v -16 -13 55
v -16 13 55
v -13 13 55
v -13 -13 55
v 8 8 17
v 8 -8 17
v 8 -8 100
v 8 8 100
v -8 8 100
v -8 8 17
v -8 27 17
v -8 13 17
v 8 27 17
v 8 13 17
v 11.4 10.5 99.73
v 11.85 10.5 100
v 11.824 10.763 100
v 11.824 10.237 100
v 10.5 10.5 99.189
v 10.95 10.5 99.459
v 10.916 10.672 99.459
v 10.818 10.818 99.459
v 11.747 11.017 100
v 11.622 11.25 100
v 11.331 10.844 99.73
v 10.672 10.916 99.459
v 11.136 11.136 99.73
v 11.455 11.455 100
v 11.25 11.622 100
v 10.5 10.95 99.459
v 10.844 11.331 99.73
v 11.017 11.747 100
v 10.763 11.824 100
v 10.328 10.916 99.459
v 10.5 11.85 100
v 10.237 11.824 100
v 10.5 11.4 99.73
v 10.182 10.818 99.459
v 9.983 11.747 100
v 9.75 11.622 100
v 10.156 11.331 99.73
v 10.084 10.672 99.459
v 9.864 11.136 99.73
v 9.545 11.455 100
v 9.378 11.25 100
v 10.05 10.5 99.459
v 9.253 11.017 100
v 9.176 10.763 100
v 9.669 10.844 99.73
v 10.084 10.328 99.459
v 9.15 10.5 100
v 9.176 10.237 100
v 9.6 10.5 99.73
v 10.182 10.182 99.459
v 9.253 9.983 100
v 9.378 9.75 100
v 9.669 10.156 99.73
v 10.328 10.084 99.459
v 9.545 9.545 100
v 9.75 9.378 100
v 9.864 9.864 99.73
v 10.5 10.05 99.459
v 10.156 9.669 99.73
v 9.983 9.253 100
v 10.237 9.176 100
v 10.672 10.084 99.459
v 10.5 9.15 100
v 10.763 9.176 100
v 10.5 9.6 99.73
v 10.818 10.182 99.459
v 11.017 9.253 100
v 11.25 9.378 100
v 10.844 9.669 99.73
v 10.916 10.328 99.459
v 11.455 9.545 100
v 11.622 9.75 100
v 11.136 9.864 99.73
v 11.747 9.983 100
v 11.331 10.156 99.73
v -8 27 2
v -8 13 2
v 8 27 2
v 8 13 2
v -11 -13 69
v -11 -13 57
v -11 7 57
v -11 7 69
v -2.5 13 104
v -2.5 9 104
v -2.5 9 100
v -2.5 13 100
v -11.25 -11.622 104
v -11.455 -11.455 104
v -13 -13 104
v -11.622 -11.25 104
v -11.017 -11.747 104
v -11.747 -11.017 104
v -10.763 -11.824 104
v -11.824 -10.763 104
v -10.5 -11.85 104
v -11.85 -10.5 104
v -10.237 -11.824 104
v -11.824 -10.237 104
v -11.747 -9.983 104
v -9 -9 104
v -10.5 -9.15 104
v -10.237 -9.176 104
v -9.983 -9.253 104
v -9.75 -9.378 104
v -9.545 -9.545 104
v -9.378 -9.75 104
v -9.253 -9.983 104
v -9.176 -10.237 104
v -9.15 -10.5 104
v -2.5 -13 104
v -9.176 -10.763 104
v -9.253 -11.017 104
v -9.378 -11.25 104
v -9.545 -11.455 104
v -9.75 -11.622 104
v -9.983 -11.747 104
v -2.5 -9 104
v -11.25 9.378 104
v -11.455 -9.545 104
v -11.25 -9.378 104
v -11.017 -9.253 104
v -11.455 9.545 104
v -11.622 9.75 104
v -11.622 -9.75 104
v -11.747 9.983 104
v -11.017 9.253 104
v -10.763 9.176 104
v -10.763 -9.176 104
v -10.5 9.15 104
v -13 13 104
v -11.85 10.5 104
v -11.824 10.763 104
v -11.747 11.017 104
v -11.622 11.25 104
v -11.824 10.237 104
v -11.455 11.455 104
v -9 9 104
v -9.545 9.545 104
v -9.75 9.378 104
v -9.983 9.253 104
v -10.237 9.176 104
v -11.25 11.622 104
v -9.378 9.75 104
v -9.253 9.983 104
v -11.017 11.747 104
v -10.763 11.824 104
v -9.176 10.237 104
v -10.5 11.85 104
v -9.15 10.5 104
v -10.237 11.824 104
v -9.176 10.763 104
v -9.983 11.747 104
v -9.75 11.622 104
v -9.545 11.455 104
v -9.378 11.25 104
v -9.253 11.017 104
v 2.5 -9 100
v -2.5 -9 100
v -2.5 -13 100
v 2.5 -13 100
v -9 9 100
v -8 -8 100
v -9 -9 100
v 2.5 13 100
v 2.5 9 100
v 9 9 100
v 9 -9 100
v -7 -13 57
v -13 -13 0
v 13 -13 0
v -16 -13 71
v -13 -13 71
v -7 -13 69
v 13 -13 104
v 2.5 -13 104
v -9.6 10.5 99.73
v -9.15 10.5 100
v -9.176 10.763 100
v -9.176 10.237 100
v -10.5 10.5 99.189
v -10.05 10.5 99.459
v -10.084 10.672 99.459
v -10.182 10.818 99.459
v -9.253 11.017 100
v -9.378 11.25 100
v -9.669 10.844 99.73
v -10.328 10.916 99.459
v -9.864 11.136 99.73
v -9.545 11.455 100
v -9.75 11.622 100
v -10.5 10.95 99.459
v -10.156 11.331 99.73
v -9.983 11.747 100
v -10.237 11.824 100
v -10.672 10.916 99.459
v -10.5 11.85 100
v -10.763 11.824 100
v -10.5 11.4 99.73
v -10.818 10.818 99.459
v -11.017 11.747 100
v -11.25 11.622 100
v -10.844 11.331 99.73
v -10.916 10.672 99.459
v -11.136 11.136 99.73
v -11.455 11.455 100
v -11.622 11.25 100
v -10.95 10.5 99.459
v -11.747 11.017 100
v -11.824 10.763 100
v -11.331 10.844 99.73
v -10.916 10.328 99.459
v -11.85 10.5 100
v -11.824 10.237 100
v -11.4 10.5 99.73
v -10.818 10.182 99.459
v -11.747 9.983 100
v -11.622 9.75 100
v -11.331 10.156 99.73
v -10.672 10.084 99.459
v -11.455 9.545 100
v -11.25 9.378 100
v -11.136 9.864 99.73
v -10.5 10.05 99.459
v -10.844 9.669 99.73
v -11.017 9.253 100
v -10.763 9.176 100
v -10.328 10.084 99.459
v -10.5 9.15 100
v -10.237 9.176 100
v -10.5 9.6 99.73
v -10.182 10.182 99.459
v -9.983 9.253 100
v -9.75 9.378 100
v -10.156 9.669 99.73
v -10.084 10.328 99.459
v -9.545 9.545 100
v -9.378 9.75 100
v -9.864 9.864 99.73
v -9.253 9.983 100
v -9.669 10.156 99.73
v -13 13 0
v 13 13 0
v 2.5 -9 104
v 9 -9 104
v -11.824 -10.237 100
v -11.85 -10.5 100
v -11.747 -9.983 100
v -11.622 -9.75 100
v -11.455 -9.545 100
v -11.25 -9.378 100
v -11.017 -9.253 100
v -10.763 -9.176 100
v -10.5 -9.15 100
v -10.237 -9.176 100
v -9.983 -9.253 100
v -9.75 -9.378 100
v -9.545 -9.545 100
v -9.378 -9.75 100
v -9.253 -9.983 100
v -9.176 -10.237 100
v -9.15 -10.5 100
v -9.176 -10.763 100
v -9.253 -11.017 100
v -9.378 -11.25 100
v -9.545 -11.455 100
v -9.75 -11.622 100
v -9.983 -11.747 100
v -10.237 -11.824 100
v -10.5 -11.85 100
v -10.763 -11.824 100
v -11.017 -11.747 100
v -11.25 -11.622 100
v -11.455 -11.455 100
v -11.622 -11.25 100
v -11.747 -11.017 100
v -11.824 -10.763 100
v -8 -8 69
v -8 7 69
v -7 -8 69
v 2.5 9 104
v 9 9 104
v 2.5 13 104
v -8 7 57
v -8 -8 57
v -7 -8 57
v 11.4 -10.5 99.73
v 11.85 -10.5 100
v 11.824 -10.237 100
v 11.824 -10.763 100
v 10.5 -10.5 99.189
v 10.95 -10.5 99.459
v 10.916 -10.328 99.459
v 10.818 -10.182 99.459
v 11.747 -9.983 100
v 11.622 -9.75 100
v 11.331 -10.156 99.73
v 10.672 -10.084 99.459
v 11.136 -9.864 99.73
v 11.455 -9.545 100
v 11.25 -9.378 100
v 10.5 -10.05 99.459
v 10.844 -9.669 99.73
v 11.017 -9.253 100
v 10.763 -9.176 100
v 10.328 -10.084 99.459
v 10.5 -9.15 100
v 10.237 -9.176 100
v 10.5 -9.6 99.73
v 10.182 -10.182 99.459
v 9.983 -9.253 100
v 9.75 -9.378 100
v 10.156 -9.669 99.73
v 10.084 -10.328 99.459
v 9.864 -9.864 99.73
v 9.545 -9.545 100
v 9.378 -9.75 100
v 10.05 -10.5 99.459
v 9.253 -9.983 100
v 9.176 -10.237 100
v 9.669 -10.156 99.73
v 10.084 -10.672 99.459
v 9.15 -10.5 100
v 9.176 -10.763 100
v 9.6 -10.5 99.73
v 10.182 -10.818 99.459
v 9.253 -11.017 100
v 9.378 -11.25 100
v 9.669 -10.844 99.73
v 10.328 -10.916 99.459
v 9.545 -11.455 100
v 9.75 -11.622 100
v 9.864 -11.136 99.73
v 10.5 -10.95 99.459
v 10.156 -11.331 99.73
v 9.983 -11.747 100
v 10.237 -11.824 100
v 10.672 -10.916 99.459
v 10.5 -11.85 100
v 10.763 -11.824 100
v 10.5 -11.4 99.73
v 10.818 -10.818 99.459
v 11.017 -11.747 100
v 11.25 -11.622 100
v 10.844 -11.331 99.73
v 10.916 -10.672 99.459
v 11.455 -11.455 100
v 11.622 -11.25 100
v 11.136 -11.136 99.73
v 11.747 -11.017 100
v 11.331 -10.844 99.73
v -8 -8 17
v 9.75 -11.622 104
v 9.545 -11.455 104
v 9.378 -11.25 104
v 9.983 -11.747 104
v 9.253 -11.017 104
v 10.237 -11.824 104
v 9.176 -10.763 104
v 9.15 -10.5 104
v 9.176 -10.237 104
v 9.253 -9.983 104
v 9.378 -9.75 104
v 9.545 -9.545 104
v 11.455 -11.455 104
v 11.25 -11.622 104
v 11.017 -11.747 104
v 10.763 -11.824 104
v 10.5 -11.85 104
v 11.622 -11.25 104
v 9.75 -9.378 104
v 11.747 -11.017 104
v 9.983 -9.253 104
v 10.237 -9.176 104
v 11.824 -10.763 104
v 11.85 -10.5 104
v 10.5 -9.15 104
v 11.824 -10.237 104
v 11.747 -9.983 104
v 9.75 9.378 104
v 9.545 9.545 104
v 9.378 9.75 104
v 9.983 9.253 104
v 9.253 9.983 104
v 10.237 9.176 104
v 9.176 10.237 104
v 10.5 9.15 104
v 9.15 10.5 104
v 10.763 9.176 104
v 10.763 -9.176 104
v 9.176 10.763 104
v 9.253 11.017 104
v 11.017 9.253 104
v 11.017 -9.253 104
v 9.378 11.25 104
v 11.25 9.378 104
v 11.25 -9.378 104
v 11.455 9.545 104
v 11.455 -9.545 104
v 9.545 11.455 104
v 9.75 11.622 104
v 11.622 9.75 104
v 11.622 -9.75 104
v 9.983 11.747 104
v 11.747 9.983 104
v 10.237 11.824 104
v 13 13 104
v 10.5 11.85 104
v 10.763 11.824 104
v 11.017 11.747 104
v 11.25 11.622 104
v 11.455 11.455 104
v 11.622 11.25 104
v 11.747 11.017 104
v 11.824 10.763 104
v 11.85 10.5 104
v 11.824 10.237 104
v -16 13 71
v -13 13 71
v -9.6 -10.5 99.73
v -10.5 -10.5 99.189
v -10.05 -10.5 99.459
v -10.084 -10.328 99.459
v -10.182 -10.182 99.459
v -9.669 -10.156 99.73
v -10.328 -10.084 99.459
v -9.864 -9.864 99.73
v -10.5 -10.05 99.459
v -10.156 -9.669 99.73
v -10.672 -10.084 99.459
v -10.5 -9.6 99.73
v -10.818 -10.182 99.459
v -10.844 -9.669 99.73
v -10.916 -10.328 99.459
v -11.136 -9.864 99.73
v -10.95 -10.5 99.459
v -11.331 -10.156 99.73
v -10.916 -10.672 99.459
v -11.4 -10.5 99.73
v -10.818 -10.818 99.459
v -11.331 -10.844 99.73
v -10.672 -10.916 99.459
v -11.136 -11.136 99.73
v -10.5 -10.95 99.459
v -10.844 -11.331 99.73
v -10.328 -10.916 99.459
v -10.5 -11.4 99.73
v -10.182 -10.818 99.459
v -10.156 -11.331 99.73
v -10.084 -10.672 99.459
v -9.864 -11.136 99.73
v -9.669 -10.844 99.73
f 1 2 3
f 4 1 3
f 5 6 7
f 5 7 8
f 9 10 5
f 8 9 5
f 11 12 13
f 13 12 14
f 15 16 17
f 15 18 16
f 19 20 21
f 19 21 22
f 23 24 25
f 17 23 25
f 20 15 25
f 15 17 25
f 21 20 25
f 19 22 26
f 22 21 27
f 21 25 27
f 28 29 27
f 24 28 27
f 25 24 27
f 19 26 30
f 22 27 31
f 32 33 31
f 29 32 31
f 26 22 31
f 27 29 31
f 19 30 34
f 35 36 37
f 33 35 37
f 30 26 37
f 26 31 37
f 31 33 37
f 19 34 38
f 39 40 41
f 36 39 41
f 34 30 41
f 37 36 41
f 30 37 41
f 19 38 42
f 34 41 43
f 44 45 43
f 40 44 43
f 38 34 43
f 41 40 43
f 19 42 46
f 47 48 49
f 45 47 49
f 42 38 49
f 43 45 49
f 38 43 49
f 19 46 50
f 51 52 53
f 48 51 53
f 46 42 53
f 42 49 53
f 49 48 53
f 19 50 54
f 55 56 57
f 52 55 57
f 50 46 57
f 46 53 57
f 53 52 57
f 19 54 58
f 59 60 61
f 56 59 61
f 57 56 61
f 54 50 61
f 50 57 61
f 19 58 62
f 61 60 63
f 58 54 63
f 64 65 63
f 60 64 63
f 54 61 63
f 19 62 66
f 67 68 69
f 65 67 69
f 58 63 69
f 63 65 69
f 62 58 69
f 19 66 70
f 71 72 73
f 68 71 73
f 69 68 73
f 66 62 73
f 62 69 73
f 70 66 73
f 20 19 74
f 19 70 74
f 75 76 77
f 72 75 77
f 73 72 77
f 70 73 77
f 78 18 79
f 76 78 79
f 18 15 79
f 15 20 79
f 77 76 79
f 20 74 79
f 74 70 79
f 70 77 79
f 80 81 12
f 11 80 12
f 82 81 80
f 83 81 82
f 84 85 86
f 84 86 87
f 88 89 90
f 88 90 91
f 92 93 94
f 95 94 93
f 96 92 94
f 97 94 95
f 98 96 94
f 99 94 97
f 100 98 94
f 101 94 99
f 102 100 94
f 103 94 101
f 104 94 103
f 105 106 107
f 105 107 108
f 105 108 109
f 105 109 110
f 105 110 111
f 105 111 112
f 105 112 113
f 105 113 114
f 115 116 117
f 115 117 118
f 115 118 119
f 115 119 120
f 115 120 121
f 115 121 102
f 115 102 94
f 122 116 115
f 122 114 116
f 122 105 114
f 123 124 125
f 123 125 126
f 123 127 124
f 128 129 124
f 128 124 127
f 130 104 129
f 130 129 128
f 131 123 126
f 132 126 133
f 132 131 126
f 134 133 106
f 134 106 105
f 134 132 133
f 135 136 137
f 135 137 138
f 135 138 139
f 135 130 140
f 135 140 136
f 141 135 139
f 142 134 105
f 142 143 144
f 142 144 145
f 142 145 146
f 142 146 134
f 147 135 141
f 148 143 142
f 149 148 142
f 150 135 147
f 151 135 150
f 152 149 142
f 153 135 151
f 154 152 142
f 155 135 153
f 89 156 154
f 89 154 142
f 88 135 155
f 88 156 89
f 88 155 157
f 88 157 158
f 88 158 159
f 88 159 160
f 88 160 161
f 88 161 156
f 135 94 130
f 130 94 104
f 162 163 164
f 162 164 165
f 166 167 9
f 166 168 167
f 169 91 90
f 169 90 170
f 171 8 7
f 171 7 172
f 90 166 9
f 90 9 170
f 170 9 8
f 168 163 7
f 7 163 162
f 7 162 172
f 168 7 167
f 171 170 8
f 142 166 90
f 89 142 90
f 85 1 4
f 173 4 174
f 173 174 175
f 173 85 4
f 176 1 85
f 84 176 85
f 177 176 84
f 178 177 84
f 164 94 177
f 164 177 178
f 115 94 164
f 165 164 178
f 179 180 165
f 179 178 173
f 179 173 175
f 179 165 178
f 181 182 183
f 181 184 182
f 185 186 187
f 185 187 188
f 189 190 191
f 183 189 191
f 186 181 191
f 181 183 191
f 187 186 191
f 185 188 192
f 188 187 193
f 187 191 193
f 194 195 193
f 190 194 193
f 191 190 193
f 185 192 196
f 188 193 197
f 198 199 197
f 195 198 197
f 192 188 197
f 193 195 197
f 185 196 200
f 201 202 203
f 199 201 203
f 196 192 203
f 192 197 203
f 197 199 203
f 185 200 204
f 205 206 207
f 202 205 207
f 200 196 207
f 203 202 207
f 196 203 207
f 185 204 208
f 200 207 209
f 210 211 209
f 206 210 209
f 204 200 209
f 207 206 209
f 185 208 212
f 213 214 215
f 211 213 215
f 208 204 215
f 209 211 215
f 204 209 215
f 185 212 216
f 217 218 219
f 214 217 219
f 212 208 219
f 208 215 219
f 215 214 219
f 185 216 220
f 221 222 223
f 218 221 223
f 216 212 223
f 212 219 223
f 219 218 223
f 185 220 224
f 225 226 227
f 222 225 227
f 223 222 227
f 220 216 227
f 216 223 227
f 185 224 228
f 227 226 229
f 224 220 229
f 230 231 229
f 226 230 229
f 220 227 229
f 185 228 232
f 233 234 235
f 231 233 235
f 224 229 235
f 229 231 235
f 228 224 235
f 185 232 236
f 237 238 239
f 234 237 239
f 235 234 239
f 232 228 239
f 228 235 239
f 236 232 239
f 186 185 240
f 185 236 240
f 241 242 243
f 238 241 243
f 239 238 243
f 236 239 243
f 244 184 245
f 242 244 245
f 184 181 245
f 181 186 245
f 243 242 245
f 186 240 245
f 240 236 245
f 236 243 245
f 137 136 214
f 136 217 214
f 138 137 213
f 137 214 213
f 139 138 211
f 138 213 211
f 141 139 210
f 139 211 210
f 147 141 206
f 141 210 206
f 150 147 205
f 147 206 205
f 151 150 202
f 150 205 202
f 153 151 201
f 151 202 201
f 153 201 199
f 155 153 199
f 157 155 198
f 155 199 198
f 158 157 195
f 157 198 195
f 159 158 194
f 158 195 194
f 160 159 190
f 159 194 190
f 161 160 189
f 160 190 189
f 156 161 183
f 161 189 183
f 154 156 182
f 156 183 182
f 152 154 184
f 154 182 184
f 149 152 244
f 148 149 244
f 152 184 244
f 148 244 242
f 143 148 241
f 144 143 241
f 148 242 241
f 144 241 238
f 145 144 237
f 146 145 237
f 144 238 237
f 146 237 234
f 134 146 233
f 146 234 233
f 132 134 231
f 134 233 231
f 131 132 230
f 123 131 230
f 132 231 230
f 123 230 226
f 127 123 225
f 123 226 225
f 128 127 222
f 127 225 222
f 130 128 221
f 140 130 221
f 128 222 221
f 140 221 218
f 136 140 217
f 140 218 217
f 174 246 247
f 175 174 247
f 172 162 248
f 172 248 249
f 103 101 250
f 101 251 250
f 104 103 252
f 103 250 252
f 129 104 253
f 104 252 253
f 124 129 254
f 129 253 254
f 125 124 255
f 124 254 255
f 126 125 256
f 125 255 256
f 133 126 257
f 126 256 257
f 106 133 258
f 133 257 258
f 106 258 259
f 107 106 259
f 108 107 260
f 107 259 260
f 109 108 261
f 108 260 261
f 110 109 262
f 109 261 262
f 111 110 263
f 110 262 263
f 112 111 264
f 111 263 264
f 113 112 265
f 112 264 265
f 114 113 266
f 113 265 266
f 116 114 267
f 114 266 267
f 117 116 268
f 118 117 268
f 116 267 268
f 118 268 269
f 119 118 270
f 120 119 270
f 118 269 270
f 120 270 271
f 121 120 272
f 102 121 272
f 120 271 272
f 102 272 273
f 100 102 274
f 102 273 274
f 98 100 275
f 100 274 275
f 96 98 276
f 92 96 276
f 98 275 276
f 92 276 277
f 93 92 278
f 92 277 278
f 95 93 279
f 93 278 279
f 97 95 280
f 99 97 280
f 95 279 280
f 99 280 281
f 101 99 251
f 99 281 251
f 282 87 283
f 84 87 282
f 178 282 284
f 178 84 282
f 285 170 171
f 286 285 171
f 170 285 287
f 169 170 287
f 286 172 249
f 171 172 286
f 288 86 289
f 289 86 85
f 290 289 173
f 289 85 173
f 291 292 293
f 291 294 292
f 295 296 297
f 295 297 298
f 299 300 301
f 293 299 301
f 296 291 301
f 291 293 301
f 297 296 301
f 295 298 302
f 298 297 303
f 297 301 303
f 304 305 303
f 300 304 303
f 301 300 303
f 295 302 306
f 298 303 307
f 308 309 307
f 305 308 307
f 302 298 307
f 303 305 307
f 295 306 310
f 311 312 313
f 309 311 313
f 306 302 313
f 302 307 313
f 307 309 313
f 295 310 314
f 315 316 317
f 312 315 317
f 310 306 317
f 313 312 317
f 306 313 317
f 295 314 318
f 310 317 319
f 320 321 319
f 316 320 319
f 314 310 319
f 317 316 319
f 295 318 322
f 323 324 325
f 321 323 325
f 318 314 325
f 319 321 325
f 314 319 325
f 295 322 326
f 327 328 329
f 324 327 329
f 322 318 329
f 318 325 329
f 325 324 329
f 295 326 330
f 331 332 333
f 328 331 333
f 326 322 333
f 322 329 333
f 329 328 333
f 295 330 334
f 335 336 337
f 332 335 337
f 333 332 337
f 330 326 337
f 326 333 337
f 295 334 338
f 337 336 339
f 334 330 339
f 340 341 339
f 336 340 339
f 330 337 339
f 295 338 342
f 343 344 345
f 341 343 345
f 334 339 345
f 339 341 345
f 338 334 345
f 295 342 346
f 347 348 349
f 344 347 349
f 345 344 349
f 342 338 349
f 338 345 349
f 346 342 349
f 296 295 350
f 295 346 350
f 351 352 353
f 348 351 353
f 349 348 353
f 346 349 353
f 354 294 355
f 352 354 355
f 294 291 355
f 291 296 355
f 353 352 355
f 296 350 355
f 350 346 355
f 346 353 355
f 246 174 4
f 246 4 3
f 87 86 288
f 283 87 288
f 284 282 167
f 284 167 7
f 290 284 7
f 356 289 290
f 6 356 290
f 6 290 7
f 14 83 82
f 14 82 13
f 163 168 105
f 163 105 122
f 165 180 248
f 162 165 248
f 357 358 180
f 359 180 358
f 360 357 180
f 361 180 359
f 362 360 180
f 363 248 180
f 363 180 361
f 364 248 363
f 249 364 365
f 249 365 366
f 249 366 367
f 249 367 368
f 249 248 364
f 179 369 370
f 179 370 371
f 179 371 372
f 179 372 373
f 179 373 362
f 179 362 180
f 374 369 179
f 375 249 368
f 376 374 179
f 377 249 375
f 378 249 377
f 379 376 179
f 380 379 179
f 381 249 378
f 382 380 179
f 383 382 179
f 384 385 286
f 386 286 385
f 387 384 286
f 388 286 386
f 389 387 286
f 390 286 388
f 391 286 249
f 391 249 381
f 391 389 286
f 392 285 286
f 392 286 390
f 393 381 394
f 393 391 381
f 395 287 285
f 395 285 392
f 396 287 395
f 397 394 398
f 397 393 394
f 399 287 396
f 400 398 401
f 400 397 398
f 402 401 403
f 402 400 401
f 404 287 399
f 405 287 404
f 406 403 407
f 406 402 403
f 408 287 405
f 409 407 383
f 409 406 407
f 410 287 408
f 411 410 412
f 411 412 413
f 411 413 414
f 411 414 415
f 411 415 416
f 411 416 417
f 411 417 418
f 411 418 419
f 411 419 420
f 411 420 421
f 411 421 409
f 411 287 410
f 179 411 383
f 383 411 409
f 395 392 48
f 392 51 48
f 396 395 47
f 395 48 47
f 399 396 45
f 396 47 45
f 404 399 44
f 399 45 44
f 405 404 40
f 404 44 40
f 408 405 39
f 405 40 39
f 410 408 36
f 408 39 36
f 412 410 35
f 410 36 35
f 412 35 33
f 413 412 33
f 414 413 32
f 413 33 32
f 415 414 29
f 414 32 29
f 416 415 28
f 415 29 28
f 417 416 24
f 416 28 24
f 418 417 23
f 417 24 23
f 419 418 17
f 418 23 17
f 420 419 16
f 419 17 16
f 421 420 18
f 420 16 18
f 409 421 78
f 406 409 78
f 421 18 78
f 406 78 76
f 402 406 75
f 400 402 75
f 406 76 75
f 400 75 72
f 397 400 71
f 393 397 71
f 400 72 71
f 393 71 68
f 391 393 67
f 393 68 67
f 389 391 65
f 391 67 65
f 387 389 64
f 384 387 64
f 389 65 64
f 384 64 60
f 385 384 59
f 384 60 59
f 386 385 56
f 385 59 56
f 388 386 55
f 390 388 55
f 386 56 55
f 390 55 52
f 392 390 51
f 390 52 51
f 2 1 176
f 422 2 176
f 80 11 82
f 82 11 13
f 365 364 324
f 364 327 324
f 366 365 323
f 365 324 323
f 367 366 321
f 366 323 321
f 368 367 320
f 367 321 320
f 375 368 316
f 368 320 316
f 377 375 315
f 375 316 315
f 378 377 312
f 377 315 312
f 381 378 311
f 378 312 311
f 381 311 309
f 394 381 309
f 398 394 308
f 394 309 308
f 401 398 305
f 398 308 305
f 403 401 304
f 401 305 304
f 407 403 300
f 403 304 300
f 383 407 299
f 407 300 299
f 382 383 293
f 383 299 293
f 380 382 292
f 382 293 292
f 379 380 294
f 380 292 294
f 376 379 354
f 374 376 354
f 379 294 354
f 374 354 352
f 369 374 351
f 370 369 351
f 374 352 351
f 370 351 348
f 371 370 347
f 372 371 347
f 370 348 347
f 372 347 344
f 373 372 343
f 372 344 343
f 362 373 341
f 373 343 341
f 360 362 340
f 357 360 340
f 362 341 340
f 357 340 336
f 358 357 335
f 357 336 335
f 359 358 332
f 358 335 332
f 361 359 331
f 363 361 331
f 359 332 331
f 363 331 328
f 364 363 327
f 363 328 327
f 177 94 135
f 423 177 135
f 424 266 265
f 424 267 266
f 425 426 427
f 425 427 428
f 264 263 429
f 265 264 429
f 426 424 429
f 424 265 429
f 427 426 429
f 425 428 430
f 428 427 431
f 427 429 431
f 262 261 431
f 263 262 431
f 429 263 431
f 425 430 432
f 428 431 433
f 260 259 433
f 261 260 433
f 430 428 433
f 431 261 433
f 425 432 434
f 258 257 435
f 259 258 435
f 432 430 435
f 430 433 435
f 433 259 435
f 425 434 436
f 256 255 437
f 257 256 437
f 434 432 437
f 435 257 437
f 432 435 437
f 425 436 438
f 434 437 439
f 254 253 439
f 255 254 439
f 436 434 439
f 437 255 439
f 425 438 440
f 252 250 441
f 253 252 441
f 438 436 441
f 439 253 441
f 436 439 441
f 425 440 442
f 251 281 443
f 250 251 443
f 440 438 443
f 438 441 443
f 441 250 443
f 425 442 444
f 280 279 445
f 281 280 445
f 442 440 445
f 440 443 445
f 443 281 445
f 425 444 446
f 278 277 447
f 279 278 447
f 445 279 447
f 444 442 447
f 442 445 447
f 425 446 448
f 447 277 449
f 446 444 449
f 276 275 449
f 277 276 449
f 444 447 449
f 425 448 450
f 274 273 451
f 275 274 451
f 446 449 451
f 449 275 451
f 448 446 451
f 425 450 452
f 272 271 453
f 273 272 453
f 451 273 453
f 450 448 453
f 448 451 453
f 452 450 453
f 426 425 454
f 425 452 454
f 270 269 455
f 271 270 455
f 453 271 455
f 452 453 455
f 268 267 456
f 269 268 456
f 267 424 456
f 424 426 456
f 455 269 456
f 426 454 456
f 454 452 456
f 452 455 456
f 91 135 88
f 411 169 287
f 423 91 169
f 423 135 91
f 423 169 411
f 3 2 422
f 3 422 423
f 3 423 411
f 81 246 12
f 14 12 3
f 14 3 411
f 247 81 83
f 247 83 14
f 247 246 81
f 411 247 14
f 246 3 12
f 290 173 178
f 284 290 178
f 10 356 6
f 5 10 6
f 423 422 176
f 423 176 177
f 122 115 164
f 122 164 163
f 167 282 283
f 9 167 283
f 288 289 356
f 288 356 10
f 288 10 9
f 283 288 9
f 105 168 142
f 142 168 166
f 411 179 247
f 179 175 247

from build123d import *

# Parameters (mm, degrees)
F0_W      = 26
F0_H      = 26
F0_W_2    = 16
F0_H_2    = 16
F1_DEPTH  = 2
F2_DEPTH  = 100
F3_W      = 26
F3_H      = 26
F3_W_2    = 18
F3_H_2    = 18
F4_DEPTH  = 4
F5_W      = 5
F5_H      = 4
F6_DEPTH  = 4
F7_D      = 2.7
F7_DEPTH  = 4
F7_TIP    = 0.8111618357
F9_W      = 3
F9_H      = 16
F10_DEPTH = 26
F11_W     = 4
F11_H     = 12
F12_DEPTH = 20
F13_W     = 16
F13_H     = 15
F14_DEPTH = 40


with BuildPart() as f1:
    # F0 (on Top) → F1 (new body)
    with BuildSketch(Plane.XY):
        Rectangle(F0_W, F0_H)
        Rectangle(F0_W_2, F0_H_2, mode=Mode.SUBTRACT)
        Rectangle(F0_W_2, F0_H_2)
    extrude(amount=F1_DEPTH)

    # F0 (on Top) → F2 (join)
    with BuildSketch(Plane.XY):
        Rectangle(F0_W, F0_H)
        Rectangle(F0_W_2, F0_H_2, mode=Mode.SUBTRACT)
    extrude(amount=F2_DEPTH)

    # F3 (on face) → F4 (join)
    with BuildSketch(Plane.XY.offset(100)):
        Rectangle(F3_W, F3_H)
        Rectangle(F3_W_2, F3_H_2, mode=Mode.SUBTRACT)
    extrude(amount=F4_DEPTH)

    # F5 (on face) → F6 (cut, through all)
    with BuildSketch(Plane.XY.offset(104)):
        with Locations((0, -11)):
            Rectangle(F5_W, F5_H)
        with Locations((0, 11)):
            Rectangle(F5_W, F5_H)
    extrude(amount=-F6_DEPTH, mode=Mode.SUBTRACT)

    # F7
    with Locations(Plane.XY.offset(104)):
        with Locations((-10.5, 10.5), (10.5, 10.5), (-10.5, -10.5), (10.5, -10.5)):
            Hole(F7_D / 2, depth=F7_DEPTH)
            with Locations((0, 0, -(F7_DEPTH + F7_TIP / 2))):  # 118° drill point
                Cone(0, F7_D / 2, F7_TIP, mode=Mode.SUBTRACT)

    # F9 (on face) → F10 (join)
    with BuildSketch(Plane.XZ.offset(13)):
        with Locations((-14.5, 63)):
            Rectangle(F9_W, F9_H)
    extrude(amount=-F10_DEPTH)

    # F11 (on face) → F12 (cut)
    with BuildSketch(Plane.XZ.offset(13)):
        with Locations((-9, 63)):
            Rectangle(F11_W, F11_H)
    extrude(amount=-F12_DEPTH, mode=Mode.SUBTRACT)

    # F13 (on face) → F14 (join)
    with BuildSketch(Plane.XZ.offset(13)):
        with Locations((0, 9.5)):
            Rectangle(F13_W, F13_H)
    extrude(amount=-F14_DEPTH)


solid = f1.part
